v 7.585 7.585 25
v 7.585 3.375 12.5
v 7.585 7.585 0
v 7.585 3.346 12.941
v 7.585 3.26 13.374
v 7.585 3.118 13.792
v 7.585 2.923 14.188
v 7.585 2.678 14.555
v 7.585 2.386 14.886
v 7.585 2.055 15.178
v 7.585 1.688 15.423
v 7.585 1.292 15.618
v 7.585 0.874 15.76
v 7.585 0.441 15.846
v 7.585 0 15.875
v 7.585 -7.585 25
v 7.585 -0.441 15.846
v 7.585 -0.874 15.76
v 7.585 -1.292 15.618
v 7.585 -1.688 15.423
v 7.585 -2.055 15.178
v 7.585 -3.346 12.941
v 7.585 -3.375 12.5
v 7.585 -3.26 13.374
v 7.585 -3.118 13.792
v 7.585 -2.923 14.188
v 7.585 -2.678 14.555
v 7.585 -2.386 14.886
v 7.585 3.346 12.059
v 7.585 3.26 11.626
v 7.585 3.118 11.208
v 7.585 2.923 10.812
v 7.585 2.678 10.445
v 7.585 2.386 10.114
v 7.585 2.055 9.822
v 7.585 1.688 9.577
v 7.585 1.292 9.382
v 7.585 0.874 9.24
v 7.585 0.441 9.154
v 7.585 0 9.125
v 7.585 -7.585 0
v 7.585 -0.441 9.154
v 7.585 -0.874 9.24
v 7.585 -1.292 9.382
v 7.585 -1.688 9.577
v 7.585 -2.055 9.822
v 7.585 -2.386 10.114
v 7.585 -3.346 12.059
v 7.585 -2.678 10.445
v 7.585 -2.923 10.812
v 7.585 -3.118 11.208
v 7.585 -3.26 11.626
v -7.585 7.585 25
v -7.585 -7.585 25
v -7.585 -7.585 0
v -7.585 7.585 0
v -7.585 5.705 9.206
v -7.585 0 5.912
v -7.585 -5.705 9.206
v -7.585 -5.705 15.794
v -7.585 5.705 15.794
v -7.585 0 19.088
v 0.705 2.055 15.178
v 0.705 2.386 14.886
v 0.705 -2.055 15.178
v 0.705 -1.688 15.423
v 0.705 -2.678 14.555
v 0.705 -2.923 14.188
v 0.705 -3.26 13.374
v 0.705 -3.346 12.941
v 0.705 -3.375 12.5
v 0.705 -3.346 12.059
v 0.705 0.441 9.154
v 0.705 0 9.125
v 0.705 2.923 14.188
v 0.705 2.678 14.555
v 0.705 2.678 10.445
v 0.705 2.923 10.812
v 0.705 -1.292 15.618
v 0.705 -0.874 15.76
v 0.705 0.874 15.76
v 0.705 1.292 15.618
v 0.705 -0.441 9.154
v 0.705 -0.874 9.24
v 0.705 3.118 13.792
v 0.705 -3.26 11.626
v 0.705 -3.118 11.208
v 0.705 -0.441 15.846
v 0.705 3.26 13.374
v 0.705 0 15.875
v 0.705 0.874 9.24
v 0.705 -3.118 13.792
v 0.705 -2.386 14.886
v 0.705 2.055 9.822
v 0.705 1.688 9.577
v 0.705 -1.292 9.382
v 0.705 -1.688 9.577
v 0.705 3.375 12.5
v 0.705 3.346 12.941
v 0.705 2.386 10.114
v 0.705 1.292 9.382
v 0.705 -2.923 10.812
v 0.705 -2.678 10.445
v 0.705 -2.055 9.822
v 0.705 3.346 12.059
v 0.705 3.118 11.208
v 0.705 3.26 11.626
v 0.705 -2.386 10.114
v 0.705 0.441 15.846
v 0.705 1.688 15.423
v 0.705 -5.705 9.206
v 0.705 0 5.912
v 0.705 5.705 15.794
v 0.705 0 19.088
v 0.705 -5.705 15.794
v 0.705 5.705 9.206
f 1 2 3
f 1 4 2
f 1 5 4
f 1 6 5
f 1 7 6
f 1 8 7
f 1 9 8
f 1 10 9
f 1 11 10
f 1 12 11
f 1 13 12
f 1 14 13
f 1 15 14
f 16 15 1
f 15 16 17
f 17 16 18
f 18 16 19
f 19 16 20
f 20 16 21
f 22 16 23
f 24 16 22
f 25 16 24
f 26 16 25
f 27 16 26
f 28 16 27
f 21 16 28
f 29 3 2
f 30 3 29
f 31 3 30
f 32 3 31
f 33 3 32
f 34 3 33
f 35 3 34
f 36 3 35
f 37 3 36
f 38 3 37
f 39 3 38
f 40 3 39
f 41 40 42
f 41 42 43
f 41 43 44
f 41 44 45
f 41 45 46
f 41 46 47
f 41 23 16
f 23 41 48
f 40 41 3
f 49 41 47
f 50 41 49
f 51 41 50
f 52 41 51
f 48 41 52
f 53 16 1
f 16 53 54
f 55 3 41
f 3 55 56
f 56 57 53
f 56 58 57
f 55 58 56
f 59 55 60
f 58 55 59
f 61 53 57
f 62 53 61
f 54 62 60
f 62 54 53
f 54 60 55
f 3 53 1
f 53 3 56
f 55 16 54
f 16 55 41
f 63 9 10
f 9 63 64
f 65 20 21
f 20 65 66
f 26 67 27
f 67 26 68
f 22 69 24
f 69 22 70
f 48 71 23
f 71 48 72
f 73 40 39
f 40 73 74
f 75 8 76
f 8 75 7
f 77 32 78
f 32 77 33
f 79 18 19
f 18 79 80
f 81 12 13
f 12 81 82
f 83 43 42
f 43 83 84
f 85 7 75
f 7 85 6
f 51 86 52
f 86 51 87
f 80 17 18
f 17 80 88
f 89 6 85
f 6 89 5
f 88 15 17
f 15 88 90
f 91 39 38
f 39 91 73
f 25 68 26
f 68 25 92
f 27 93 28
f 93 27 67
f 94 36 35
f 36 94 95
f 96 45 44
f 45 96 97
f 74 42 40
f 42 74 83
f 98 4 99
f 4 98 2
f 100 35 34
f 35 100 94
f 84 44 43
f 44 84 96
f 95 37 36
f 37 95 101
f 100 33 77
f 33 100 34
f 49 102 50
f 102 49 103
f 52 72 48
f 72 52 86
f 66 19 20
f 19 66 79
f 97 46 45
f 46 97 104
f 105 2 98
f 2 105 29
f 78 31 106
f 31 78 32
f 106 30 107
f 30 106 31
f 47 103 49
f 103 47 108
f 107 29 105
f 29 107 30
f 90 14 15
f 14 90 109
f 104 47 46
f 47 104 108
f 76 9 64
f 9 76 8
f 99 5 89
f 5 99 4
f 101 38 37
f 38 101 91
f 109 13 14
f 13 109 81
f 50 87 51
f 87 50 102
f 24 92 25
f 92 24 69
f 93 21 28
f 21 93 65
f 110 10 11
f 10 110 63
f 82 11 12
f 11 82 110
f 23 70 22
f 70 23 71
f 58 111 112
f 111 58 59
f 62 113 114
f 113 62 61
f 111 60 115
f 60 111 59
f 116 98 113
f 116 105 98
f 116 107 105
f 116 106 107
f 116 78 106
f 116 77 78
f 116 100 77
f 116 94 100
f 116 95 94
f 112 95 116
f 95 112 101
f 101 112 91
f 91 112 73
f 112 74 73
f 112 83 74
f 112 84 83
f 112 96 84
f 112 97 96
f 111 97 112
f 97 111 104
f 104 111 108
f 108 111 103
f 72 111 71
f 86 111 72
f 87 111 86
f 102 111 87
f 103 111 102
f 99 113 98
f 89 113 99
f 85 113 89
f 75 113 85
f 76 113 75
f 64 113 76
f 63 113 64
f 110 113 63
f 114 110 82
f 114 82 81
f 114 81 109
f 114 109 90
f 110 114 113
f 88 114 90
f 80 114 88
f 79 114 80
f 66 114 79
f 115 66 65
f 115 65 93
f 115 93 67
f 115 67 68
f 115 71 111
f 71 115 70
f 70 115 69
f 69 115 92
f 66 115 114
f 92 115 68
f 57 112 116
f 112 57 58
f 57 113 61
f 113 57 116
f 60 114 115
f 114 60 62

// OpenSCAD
// file: params.scad
// adaptive-highchair parameters — all units mm
// Home Depot stock, straight cuts to length, splayed legs. See BOM.md.

/* [Stock — straight cuts to length, see BOM.md] */
TUBE          = 19.05;  // 3/4" square aluminium tube, nominal
TUBE_WALL     = 1.59;   // 1/16" wall
LEG_LEN       = 760;    // cut leg length
RAIL_LEN      = 450;    // cut rail length

/* [Frame — splayed outward] */
BASE_SPAN_X   = 640;    // foot footprint width
BASE_SPAN_Y   = 700;    // foot footprint depth
TOP_SPAN_X    = 400;    // leg spacing at the top
TOP_SPAN_Y    = 460;
SPLAY_X       = asin((BASE_SPAN_Y - TOP_SPAN_Y) / 2 / LEG_LEN);
SPLAY_Y       = asin((BASE_SPAN_X - TOP_SPAN_X) / 2 / LEG_LEN);
FRAME_TOP     = LEG_LEN * cos(SPLAY_X) * cos(SPLAY_Y);

/* [Seat] */
SEAT_W        = 240;
SEAT_D        = 260;
SEAT_T        = 14;
SEAT_H        = 545;   // above floor; 21.5"
SEAT_TILT_DEG = 5;

/* [Back] */
BACK_W        = 240;
BACK_H        = 400;
BACK_T        = 14;
BACK_RECLINE  = 8;

/* [Footrest] */
FOOT_W        = 240;
FOOT_D        = 140;
FOOT_T        = 12;
FOOT_H        = 200;
FOOT_REACH    = 300;

/* [Tray] */
TRAY_W        = 600;
TRAY_D        = 500;
TRAY_T        = 12;
TRAY_H        = 700;
TRAY_NOTCH_W  = 300;
TRAY_NOTCH_D  = 100;

/* [Thread / fastener — change this block to swap hardware] */
// Current: 1/4-20 UNC hex bolt + Nyloc nut, captive in nut_insert.scad.
// To go back to M5 x 0.8, use:
//   THREAD_NAME="M5 x 0.8"; THREAD_MAJOR=5; THREAD_PITCH=0.8;
//   NUT_AF=8.0; NUT_H=5.0; BOLT_CLEAR_D=5.2; BOLT_LEN=20;
THREAD_NAME   = "1/4-20 UNC";
THREAD_MAJOR  = 6.35;   // nominal major diameter = 0.25"
THREAD_TPI    = 20;     // threads per inch (imperial)
THREAD_PITCH  = 25.4 / THREAD_TPI;  // 1.27 mm
NUT_AF        = 11.11;  // 7/16" across flats
NUT_H         = 8.0;    // Nyloc height; pocket uses NUT_H + NUT_POCKET_CLEAR
NUT_POCKET_CLEAR = 0.30;  // extra hex pocket depth / across-flats clearance
BOLT_CLEAR_D  = 6.75;   // 17/64" drill; drill only, no tapping
BOLT_LEN      = 25.4;   // 1" bolt: reaches the nut inside the tube
WASHER_T      = 1.6;

/* [Strap] */
INSERT_L      = 25;    // captive-nut insert length (nut_insert.scad)
STRAP_W       = 25;    // 1" webbing, heat-seal cut ends
STRAP_CLEAR   = 1;

/* [Print] */
$fn           = 48;
CLEARANCE     = 0.4;
// main file
// Captive 1/4-20 nut insert for 3/4" square aluminium tube.
// Slide into the tube end, align with a drilled hole, bolt through the tube.
// No tapping. Units mm. See BOM.md and drill_jig.scad.

include <params.scad>

/* [Insert] */
TUBE_ID       = TUBE - 2 * TUBE_WALL;   // 15.87 nominal
INSERT_CLEAR  = 0.35;                   // per side, for FDM fit
INSERT_W      = TUBE_ID - 2 * INSERT_CLEAR;  // ~15.17

/* [Fastener — all thread values come from params.scad] */
HEX_R         = (NUT_AF + NUT_POCKET_CLEAR) / 2 / cos(30);
HOLE_Z        = INSERT_L / 2;

$fn = 48;

module nut_insert() {
    difference() {
        translate([-INSERT_W / 2, -INSERT_W / 2, 0])
            cube([INSERT_W, INSERT_W, INSERT_L], center = false);

        // Bolt clearance through the insert.
        translate([0, 0, HOLE_Z])
            rotate([0, 90, 0])
                cylinder(h = INSERT_W + 2, r = BOLT_CLEAR_D / 2, center = true);

        // Hex pocket on the far wall captures the nut against rotation.
        translate([-INSERT_W / 2 - 0.01, 0, HOLE_Z])
            rotate([0, 90, 0])
                cylinder(h = NUT_H + NUT_POCKET_CLEAR, r = HEX_R, center = false, $fn = 6);
    }
}

nut_insert();
